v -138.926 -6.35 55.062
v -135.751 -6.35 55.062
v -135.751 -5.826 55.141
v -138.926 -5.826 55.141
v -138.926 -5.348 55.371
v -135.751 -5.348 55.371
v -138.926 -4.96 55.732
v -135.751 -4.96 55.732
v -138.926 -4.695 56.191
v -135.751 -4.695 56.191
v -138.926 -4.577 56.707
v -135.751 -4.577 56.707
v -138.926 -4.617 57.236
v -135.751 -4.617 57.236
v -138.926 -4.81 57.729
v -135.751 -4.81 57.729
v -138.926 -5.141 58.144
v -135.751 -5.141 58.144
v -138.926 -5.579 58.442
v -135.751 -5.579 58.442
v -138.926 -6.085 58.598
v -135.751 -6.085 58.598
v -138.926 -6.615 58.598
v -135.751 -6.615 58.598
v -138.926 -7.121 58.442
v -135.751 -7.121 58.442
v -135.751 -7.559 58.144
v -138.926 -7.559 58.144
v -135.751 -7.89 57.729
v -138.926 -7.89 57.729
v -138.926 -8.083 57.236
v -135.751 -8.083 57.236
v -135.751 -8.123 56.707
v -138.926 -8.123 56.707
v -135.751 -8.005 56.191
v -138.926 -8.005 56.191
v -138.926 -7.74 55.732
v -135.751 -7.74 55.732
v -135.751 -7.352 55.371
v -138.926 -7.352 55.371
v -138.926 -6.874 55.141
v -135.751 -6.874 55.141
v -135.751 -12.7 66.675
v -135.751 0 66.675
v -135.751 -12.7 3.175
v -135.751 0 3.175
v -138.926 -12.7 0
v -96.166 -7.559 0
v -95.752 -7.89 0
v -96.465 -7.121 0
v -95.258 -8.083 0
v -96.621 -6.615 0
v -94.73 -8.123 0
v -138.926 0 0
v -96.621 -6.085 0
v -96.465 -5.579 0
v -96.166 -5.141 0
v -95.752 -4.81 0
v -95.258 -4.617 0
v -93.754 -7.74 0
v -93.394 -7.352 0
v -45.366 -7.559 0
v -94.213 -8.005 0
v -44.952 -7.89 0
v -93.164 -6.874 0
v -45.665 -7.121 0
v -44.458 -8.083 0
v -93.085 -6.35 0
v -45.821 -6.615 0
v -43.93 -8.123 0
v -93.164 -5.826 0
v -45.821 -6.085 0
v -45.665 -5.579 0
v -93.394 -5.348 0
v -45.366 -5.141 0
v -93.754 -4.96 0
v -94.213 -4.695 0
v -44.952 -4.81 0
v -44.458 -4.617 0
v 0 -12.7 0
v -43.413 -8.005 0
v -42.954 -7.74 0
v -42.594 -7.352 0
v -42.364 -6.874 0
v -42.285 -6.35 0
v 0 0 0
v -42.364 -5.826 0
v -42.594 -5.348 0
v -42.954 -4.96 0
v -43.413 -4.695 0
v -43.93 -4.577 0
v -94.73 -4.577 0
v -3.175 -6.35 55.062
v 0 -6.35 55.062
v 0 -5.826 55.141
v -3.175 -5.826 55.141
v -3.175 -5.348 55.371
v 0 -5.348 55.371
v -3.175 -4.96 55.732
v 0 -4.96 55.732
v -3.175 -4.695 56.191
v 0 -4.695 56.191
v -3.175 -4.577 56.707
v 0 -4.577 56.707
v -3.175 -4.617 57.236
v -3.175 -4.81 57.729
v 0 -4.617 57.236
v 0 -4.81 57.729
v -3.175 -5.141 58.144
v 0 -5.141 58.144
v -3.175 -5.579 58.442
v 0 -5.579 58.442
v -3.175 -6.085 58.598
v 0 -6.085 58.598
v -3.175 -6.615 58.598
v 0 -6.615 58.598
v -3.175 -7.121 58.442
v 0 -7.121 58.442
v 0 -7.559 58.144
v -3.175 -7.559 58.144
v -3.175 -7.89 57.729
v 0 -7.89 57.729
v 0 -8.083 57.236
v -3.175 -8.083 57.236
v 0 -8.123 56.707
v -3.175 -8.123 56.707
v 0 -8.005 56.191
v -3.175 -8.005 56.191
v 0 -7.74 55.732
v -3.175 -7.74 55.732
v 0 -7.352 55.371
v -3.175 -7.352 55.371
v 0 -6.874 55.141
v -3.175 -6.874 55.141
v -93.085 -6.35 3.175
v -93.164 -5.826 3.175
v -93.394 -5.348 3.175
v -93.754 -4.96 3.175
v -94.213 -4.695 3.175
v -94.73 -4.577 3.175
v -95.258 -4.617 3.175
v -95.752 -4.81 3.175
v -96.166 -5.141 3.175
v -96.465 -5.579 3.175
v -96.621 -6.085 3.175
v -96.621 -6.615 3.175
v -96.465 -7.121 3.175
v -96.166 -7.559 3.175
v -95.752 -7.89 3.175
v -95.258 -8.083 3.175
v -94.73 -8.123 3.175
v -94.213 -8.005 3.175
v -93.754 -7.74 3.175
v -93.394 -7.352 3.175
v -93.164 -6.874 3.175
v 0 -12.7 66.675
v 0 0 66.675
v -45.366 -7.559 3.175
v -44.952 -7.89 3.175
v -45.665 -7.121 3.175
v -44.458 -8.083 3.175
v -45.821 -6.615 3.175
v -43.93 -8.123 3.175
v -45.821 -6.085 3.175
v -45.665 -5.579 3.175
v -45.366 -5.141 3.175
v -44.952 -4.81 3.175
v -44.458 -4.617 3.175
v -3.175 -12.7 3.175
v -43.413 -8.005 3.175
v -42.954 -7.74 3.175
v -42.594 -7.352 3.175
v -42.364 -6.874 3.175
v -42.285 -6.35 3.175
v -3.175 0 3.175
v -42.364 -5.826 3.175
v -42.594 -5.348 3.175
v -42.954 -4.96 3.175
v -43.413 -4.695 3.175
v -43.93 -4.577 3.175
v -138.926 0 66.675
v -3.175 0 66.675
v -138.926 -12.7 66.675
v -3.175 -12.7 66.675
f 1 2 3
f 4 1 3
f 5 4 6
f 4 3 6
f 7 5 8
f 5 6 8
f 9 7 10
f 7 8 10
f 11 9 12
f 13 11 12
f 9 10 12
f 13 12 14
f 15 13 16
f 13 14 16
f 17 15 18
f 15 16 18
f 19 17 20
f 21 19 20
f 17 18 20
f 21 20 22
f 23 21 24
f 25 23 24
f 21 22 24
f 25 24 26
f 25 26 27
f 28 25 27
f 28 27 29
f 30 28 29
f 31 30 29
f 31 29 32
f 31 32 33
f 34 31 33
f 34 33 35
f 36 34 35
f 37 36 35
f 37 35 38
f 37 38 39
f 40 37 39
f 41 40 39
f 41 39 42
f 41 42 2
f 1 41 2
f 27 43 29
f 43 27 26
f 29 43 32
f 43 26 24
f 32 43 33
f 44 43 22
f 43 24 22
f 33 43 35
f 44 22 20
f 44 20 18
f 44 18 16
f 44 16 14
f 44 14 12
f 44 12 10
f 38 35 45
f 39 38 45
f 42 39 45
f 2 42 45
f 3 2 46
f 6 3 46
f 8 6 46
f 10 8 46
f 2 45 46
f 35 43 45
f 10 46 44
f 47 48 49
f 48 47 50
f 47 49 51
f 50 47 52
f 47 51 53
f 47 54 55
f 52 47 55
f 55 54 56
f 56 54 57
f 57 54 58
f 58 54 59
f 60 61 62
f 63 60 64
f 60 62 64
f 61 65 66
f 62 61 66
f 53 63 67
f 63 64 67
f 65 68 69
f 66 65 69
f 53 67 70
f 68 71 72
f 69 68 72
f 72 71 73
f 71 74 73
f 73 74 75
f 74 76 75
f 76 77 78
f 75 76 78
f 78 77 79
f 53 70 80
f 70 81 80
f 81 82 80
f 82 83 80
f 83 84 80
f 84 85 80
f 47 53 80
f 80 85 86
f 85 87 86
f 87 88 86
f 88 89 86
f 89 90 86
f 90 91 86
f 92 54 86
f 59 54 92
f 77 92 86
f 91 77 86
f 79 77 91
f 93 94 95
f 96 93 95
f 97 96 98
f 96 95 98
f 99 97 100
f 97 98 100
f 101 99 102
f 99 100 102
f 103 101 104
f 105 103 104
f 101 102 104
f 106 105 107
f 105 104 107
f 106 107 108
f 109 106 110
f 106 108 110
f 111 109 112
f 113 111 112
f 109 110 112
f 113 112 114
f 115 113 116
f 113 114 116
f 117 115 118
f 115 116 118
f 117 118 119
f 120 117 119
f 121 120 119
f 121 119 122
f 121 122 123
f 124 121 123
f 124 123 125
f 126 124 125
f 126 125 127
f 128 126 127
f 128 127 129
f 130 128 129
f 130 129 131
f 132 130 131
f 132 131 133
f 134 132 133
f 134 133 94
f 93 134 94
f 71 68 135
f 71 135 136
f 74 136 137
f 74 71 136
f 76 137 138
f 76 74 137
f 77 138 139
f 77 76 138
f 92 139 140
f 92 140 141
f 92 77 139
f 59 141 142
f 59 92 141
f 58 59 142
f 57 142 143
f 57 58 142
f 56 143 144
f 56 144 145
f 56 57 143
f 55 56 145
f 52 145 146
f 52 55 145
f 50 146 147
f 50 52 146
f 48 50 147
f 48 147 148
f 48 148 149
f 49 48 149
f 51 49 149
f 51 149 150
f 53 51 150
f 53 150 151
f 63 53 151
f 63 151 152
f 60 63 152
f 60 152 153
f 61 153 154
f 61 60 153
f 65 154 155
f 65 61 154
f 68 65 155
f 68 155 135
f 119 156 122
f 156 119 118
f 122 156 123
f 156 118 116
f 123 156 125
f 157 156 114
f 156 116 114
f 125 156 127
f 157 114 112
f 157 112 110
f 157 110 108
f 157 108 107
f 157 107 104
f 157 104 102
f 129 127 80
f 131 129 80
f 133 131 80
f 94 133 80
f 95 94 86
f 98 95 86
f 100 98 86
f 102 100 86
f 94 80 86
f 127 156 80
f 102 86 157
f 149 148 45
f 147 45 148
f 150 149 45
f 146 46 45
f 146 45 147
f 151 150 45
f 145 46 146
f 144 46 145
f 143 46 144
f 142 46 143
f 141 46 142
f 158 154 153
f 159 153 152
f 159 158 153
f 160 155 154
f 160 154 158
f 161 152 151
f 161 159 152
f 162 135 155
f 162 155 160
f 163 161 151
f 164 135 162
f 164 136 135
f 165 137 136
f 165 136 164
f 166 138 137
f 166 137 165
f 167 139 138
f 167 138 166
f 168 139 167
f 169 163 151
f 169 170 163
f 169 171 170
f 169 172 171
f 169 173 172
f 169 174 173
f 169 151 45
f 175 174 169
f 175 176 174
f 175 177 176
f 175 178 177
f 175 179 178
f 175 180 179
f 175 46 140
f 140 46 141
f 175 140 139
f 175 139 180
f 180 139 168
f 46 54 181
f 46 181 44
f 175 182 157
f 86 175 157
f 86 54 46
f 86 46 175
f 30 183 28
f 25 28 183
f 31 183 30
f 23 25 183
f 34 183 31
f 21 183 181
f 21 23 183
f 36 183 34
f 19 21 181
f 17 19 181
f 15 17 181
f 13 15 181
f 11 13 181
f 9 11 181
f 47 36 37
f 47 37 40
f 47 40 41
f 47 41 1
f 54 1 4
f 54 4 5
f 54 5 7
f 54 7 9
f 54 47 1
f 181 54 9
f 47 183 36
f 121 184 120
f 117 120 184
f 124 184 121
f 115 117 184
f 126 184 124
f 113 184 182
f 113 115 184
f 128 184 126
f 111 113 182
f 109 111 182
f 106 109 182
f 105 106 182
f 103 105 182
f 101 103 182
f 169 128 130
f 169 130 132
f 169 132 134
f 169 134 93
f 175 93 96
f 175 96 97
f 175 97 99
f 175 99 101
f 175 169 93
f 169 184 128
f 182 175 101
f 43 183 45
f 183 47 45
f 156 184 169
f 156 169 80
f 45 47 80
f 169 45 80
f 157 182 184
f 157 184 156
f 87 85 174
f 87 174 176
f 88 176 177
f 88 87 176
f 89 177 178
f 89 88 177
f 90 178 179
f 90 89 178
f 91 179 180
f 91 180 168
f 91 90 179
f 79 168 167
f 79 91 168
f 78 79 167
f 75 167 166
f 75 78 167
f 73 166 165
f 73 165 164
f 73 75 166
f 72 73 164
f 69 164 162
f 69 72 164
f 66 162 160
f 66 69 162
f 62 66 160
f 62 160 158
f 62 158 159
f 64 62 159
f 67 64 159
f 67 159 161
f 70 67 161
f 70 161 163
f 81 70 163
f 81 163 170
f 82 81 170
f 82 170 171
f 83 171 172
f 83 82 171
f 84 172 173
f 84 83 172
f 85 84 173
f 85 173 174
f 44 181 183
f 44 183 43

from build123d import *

# Parameters (mm, degrees)
SKETCH1_W           = 138.92560988
SKETCH1_H           = 12.7
SKETCH1_R           = 1.778
BOSS_EXTRUDE1_DEPTH = 3.175
SKETCH2_W           = 3.175
SKETCH2_H           = 12.7
BOSS_EXTRUDE2_DEPTH = 63.5
SKETCH3_R           = 1.778
CUT_EXTRUDE1_DEPTH  = 152.4


with BuildPart() as part:
    # Sketch1 → Boss-Extrude1 (new body)
    with BuildSketch(Plane.XY):
        with Locations((-69.46280494, -6.35)):
            Rectangle(SKETCH1_W, SKETCH1_H)
        with Locations((-94.86280494, -6.35)):
            Circle(SKETCH1_R, mode=Mode.SUBTRACT)
        with Locations((-44.06280494, -6.35)):
            Circle(SKETCH1_R, mode=Mode.SUBTRACT)
    extrude(amount=BOSS_EXTRUDE1_DEPTH)

    # Sketch2 → Boss-Extrude2 (add)
    with BuildSketch(Plane.XY.offset(3.175)):
        with Locations((-137.33810988, -6.35)):
            Rectangle(SKETCH2_W, SKETCH2_H)
        with Locations((-1.5875, -6.35)):
            Rectangle(SKETCH2_W, SKETCH2_H)
    extrude(amount=BOSS_EXTRUDE2_DEPTH)

    # Sketch3 → Cut-Extrude1 (cut)
    with BuildSketch(Plane(origin=(0, 0, 0), x_dir=(0, 0, -1), z_dir=(1, 0, 0))):
        with Locations((-56.840236332, -6.35)):
            Circle(SKETCH3_R)
    extrude(amount=-CUT_EXTRUDE1_DEPTH, mode=Mode.SUBTRACT)


solid = part.part
